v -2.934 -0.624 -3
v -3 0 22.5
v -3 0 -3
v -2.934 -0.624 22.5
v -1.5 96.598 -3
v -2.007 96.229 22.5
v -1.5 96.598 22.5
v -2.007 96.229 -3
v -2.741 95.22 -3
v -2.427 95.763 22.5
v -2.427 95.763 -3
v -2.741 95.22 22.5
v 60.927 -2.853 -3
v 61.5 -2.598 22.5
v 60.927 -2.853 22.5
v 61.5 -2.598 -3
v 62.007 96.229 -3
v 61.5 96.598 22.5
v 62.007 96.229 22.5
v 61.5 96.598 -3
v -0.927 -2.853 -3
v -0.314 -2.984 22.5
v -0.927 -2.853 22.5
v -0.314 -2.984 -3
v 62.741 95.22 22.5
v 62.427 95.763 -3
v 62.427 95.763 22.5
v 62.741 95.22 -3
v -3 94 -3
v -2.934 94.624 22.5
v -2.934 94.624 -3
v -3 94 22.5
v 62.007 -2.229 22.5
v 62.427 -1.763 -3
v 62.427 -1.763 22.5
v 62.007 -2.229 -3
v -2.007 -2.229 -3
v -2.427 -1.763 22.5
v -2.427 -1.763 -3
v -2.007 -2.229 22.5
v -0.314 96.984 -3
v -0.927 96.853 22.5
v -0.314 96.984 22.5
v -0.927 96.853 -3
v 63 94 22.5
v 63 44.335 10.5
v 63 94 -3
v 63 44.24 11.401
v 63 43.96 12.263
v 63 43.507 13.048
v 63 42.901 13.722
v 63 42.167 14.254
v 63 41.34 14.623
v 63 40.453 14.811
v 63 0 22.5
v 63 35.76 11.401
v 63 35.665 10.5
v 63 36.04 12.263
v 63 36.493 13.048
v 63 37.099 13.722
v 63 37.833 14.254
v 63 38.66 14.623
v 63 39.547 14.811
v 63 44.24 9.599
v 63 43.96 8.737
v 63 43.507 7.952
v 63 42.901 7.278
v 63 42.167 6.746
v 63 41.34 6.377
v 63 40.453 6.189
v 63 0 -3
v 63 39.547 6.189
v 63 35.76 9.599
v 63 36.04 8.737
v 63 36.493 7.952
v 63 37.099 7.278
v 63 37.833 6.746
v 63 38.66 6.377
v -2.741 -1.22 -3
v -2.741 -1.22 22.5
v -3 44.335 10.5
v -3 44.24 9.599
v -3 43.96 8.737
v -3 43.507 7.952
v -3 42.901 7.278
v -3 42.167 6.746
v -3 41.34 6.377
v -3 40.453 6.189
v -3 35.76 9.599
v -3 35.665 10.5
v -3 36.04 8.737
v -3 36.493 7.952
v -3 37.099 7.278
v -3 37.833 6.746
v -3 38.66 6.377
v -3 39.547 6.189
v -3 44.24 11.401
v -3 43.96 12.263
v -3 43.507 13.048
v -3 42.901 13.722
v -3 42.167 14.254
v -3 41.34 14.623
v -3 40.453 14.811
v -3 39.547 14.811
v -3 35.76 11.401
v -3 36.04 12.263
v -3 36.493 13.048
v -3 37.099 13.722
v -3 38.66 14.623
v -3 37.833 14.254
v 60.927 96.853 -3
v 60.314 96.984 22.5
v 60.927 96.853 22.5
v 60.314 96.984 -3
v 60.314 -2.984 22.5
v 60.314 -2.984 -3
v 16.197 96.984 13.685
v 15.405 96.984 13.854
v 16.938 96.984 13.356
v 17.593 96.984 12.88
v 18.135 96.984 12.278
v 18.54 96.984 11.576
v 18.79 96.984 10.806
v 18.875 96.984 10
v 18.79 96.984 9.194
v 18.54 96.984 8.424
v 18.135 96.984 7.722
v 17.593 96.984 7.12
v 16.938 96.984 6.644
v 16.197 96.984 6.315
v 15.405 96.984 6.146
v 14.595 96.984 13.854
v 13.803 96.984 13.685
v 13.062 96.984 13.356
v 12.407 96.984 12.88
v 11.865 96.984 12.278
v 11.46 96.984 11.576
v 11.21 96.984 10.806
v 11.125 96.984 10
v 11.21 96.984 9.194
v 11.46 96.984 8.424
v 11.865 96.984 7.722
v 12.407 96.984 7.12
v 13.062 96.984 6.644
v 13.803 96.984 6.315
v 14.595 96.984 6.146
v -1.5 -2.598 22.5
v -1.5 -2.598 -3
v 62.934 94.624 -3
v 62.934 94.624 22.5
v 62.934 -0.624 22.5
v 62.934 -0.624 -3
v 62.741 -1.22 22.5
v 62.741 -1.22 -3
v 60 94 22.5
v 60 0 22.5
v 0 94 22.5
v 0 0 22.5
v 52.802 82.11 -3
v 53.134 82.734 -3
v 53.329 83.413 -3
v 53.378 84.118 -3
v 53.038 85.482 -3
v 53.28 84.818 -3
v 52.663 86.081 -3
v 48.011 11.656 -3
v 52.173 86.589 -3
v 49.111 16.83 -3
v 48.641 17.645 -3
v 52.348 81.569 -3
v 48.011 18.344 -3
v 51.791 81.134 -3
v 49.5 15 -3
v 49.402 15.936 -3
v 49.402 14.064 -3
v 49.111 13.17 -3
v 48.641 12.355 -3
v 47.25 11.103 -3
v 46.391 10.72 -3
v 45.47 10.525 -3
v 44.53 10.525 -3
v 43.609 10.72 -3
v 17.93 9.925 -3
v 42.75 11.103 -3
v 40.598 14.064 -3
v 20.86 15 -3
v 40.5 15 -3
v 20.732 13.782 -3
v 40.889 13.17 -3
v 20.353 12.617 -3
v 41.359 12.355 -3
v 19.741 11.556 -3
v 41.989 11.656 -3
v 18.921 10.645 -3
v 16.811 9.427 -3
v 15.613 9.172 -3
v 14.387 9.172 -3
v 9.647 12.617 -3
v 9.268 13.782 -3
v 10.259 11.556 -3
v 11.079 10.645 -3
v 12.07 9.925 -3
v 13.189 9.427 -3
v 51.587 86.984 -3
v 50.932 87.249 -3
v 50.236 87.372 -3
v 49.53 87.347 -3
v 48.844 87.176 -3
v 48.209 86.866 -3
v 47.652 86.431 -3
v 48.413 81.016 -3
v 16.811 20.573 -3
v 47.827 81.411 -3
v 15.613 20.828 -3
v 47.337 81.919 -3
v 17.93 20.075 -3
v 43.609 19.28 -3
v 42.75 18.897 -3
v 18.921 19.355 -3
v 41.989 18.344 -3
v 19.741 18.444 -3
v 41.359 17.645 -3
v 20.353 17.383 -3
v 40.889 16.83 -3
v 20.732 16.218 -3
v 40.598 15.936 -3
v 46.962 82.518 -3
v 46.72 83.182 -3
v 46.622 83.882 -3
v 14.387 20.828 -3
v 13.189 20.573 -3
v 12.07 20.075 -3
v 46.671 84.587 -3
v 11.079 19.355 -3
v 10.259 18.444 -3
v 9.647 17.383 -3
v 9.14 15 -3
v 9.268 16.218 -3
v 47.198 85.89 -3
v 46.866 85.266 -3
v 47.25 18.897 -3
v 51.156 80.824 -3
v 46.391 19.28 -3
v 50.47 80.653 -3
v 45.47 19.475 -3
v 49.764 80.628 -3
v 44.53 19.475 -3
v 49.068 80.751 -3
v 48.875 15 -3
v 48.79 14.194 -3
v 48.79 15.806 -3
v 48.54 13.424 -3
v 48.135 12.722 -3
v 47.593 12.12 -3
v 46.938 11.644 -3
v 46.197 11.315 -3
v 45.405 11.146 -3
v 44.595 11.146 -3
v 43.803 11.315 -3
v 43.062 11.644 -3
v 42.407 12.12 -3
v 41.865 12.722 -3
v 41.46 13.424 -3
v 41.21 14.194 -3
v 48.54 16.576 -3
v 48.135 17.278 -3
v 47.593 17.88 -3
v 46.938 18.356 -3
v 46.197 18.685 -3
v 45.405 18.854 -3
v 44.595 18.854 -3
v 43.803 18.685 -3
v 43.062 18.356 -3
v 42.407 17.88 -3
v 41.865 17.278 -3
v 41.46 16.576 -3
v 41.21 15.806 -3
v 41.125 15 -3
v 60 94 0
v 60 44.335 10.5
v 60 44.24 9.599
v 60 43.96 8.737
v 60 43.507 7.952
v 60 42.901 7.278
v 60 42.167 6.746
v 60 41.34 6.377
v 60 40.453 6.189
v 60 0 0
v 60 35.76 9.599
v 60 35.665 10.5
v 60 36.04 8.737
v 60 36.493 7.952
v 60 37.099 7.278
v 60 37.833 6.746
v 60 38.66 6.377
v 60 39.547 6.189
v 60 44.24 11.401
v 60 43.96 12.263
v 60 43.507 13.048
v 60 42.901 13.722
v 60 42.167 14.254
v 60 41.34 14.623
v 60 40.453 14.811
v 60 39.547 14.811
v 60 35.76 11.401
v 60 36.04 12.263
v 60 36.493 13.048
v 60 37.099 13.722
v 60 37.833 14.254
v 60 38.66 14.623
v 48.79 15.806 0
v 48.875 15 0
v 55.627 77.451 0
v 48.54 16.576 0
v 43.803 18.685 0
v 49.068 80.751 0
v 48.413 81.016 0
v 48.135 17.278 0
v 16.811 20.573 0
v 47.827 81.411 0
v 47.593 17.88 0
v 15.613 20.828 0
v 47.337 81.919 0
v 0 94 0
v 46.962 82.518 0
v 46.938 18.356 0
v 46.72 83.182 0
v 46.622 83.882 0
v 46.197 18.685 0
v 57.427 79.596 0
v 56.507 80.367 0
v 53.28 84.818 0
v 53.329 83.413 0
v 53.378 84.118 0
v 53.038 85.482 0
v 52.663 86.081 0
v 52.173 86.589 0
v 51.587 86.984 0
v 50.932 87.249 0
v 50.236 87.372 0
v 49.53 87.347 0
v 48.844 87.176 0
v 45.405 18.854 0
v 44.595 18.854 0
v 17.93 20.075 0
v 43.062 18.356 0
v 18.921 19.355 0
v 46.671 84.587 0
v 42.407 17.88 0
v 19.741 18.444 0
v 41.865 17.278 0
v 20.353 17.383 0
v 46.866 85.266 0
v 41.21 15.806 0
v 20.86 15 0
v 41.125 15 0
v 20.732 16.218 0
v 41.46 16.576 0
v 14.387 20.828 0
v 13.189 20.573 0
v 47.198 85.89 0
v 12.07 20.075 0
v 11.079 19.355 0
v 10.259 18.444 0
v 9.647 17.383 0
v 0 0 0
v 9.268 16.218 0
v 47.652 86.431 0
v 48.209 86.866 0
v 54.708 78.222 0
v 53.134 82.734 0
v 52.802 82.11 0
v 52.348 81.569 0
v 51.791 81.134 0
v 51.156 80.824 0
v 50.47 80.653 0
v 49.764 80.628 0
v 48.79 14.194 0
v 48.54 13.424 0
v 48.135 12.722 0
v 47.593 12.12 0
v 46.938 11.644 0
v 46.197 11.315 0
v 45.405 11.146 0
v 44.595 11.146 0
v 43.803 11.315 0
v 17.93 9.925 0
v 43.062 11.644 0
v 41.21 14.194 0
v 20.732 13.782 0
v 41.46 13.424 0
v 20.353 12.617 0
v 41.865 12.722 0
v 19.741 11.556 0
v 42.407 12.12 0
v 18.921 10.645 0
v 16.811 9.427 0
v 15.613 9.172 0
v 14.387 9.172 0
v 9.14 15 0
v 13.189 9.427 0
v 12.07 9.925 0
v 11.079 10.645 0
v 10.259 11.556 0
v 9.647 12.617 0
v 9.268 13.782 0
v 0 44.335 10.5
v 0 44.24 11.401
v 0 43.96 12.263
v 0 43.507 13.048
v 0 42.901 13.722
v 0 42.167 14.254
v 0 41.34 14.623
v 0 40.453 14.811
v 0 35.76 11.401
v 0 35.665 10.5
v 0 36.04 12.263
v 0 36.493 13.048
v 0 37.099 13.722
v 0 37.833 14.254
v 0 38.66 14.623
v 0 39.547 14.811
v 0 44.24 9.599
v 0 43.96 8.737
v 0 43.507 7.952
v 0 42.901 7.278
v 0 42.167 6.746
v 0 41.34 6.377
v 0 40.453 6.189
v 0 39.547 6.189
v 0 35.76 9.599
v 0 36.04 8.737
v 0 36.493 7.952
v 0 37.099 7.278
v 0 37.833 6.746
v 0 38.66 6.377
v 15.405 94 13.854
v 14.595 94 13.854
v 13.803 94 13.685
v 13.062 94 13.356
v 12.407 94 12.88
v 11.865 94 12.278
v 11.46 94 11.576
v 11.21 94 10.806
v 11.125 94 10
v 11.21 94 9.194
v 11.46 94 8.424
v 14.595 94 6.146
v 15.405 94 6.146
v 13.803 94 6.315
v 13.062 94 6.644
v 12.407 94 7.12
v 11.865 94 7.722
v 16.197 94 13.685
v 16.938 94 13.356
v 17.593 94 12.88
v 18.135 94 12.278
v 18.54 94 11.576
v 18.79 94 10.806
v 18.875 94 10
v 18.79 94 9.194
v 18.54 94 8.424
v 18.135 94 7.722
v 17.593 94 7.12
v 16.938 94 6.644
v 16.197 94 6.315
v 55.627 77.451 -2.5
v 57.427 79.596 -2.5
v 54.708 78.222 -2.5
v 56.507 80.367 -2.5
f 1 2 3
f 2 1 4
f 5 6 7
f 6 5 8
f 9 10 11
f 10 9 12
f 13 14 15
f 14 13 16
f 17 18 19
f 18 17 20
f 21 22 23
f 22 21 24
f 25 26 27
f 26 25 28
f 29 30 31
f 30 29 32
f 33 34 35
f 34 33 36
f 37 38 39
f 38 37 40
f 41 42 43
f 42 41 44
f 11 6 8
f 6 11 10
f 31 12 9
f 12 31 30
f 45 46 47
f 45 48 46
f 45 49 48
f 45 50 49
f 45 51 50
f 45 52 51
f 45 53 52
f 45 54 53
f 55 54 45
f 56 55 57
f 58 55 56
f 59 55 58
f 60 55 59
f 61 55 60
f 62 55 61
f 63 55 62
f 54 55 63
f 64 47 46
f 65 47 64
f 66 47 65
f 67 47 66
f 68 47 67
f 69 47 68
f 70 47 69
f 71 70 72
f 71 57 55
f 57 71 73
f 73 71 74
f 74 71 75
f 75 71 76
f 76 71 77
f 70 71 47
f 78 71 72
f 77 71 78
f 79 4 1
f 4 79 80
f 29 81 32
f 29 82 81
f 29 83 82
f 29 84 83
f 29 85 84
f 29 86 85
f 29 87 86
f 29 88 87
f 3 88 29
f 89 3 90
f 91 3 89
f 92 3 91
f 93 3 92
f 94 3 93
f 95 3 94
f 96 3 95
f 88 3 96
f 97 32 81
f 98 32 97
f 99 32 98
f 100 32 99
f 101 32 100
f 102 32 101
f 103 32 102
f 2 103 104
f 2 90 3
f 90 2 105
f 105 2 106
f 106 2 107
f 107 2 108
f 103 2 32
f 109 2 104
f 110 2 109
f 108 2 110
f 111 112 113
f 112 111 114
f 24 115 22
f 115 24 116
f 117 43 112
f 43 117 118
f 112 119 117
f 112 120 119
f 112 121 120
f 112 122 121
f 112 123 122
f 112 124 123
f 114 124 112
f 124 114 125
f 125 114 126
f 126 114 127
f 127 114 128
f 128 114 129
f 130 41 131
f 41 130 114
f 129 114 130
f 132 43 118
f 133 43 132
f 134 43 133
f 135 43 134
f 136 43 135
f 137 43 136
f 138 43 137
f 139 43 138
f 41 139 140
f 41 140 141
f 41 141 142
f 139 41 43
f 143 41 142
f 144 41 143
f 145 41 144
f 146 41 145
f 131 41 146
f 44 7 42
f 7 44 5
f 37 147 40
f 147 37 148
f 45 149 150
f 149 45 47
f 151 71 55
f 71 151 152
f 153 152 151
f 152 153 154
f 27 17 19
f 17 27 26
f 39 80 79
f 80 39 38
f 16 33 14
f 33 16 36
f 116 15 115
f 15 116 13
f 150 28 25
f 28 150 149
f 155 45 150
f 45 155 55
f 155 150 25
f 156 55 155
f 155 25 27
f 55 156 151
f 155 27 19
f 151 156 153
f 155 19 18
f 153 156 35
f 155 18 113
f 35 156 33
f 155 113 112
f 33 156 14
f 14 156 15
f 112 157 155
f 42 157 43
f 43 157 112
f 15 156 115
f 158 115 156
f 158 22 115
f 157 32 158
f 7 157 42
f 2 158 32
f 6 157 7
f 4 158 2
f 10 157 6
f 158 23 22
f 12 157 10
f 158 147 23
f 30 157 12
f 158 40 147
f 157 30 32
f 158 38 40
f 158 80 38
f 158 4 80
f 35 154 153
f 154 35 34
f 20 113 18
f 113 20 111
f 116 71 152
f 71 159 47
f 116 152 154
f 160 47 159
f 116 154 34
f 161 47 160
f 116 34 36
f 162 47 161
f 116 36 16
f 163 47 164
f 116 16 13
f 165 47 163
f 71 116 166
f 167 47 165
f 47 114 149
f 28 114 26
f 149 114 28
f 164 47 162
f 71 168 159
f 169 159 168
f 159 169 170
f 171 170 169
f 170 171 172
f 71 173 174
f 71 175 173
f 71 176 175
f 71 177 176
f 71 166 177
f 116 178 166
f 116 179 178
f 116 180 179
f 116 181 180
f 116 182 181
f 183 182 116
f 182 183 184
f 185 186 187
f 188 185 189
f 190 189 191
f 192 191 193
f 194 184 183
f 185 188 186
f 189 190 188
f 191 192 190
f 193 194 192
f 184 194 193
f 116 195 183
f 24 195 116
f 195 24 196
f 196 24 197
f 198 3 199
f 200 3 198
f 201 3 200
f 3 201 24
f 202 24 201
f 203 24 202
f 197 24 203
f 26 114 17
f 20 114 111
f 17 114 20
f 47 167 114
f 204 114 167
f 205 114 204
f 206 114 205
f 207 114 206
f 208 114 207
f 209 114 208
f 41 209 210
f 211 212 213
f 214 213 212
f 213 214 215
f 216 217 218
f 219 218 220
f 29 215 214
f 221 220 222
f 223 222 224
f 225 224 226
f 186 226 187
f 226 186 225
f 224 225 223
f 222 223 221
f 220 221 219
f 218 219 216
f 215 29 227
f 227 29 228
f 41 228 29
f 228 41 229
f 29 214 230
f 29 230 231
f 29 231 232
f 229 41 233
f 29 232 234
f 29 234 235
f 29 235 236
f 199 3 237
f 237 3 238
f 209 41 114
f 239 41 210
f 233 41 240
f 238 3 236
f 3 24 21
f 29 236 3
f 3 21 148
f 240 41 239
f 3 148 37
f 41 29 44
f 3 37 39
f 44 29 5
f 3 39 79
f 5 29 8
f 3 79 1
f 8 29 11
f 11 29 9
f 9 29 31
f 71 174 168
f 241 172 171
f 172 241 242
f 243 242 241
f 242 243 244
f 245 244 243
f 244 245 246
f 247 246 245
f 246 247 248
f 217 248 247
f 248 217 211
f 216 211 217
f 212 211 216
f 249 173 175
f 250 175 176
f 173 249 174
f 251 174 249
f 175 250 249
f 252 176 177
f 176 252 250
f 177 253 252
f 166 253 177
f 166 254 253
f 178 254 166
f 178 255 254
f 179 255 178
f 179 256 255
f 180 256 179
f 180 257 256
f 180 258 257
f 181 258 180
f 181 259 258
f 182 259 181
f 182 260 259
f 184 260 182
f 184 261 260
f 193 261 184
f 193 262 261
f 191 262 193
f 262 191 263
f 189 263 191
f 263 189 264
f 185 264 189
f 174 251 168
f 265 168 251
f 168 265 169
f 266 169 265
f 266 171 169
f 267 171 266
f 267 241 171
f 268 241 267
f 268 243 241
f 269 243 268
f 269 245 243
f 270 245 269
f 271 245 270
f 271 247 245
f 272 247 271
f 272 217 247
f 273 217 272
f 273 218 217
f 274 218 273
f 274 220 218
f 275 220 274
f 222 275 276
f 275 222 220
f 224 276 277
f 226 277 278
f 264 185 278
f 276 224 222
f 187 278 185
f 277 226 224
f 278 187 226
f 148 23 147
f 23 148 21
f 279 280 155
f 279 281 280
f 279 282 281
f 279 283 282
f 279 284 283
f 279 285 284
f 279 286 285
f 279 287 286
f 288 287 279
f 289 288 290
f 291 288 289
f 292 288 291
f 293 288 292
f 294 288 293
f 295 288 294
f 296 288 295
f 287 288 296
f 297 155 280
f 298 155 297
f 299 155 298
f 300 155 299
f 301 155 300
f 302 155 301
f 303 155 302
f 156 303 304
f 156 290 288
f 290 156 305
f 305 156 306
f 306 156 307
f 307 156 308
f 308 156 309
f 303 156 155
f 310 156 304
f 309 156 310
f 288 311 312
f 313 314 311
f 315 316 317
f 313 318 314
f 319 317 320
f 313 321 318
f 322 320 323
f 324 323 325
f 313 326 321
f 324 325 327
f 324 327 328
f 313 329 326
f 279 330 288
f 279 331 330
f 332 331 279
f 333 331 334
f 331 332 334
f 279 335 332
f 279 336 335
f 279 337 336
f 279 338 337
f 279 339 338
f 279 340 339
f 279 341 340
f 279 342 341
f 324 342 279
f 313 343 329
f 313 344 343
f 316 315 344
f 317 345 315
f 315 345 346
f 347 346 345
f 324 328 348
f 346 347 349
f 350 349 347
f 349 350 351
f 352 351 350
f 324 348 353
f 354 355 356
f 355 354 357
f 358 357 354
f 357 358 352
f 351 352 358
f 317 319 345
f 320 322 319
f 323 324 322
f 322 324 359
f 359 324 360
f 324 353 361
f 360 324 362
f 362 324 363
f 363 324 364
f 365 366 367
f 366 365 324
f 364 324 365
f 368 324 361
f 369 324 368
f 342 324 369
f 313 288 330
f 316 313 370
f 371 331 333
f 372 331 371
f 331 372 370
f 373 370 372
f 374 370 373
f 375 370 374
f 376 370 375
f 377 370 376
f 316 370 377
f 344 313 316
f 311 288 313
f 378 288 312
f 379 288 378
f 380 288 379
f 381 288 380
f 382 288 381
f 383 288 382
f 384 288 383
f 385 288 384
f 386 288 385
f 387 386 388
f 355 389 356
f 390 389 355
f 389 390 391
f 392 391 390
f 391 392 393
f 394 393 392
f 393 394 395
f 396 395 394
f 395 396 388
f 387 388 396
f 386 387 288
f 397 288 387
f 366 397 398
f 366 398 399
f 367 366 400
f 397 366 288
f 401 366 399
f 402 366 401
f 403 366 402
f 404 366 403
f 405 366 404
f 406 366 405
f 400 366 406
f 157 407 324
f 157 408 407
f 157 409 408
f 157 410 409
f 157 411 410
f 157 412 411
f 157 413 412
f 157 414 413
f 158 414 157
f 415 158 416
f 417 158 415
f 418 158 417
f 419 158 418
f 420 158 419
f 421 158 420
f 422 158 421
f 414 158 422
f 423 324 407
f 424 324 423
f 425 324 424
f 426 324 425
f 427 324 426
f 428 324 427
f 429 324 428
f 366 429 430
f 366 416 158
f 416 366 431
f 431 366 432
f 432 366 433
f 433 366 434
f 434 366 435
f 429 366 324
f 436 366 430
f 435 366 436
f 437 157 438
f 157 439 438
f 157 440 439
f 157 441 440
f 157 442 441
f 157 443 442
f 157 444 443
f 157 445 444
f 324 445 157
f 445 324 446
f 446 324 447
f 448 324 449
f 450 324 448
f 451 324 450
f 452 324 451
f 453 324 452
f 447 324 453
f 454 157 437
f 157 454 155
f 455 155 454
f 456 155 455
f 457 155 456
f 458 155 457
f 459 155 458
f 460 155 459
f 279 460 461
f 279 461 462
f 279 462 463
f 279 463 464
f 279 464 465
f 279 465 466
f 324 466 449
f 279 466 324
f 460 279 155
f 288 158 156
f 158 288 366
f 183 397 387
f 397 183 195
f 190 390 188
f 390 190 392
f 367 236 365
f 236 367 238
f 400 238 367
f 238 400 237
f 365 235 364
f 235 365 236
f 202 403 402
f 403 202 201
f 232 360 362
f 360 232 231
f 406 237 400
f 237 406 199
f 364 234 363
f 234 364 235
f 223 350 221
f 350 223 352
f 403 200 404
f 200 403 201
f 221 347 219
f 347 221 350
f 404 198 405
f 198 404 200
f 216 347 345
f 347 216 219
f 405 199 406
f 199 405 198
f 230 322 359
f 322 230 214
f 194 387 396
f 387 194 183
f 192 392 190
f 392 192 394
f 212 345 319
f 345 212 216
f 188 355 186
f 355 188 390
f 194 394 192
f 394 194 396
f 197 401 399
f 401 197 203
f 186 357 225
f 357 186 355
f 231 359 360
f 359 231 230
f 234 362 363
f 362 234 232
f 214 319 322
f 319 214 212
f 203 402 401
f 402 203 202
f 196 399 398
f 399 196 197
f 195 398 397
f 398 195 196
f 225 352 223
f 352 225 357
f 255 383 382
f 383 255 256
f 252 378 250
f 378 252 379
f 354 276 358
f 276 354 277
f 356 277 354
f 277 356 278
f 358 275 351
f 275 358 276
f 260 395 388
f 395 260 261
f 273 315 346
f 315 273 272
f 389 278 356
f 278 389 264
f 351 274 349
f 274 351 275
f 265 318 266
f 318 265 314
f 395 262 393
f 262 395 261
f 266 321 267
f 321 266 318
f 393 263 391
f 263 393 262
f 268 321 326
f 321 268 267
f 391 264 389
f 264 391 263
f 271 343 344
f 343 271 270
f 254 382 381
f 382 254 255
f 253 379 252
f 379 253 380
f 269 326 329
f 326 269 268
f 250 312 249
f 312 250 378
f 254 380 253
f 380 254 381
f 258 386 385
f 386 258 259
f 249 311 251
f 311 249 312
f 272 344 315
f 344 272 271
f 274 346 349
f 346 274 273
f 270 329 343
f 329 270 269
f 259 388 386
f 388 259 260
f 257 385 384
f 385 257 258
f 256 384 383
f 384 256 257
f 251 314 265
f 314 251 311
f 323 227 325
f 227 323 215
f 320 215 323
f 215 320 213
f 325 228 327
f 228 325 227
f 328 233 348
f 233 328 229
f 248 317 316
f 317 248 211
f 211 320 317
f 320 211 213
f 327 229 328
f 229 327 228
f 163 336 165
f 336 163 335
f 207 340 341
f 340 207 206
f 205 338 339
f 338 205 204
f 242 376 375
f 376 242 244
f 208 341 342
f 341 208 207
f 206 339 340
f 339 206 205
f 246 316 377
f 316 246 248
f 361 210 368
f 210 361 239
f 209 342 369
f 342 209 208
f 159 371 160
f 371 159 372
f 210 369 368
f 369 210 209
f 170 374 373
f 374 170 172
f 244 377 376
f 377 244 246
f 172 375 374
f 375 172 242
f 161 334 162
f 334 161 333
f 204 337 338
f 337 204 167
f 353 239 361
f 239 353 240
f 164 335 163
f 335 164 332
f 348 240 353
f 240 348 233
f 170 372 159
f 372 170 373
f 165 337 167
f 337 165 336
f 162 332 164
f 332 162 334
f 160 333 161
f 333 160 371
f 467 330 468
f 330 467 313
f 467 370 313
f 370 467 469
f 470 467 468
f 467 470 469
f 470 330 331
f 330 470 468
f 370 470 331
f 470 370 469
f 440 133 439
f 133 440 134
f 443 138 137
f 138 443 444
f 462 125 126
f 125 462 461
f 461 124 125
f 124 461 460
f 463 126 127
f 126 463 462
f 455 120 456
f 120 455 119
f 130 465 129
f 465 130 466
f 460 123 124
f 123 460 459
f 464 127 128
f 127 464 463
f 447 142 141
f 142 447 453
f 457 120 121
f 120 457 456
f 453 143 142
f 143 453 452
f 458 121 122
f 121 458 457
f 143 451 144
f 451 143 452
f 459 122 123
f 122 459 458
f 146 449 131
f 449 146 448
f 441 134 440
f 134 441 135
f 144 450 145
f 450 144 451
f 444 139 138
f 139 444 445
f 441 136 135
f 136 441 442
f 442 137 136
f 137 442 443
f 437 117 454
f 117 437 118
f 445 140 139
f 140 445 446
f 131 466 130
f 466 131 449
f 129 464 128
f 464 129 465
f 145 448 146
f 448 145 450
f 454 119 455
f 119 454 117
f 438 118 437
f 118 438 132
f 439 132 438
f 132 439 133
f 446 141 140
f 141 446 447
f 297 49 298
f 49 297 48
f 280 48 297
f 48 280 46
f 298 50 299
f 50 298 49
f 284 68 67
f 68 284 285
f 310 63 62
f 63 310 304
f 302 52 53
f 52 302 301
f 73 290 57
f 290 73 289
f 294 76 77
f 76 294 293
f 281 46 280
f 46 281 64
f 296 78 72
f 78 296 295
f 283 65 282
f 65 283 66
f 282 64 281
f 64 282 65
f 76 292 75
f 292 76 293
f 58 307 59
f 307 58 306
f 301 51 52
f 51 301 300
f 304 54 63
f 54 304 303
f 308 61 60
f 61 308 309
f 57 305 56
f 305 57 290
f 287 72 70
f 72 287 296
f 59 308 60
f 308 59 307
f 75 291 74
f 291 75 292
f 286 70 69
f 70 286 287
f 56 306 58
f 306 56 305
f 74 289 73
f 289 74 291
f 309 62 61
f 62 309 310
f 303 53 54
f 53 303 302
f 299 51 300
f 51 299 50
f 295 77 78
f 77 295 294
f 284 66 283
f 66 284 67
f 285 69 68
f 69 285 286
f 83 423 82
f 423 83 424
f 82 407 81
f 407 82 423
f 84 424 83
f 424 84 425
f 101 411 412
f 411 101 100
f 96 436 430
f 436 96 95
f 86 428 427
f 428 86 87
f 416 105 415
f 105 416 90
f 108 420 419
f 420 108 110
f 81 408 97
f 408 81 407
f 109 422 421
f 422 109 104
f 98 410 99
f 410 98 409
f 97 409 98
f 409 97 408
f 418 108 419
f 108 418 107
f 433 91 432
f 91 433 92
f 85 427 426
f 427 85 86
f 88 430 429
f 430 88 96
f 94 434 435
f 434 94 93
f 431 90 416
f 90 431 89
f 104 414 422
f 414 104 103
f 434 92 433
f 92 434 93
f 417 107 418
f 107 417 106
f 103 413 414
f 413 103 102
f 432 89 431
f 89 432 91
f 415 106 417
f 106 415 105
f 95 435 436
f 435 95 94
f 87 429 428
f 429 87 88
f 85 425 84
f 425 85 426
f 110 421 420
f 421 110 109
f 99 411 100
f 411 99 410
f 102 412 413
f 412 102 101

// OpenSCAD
// file: lib/parts.scad
module potentiometer(angle = 0) {

	potCylR = 17.04 / 2;
	potCylD = 9.3;
	potShaftR = 6.76 / 2;
	potShaftD = 15;
	potBoard = 12;
	potBoardD = 6.3;
	potTabW = 2.8;
	potTabH = 1.2;
	potTabD = 2.5;

	rotate([0, 180, angle])
	translate([0, 0, -potCylD/2])

	union() {
		cylinder(r = potCylR, h = potCylD, center = true);
		translate([0, 0, potCylD])
			cylinder(r = potShaftR, h = potShaftD, center = true);
		translate([0, -potCylR, potCylD/2 - potBoardD])
			cube([potBoard, potCylR * 2, potBoardD]);
		translate([-potTabW/2, -potCylR, potCylD / 2])
			#cube([potTabW, potTabH, potTabD]);
	}
}

module sw3pdt() {
	swBodyW = 18;
	swBodyH = 17;
	swBodyD = 20;
	swShaftR = 11.72 / 2;
	swShaftD = 12.5;
	swShaft2R = 8 / 2;
	swShaft2D = 5.11;
	swShaft3D = 5;

	rotate([0, 180, 0])
		union() {
			translate([-swBodyW/2, -swBodyH/2, -swBodyD])
				#cube([swBodyW, swBodyH, swBodyD]);
			translate([0, 0, swShaftD / 2]) //  swBodyD + swShaftD/2])
				cylinder(r = swShaftR, h = swShaftD, center = true);
			translate([0, 0, swShaftD + swShaft2D / 2]) //  swBodyD + swShaftD/2])
				cylinder(r = swShaft2R, h = swShaft3D, center = true);
			translate([0, 0, swShaftD + swShaft2D + swShaft3D / 2]) //  swBodyD + swShaftD/2])
				cylinder(r = swShaftR, h = swShaft3D, center = true);
		}
}

module swdp3t() {
    swBodyW = 12.62;
    swBodyH = 13;
    swBodyD = 14.5;
    swShaftR = 5.8 / 2;
    swShaftD = 8.5;

	rotate([0, 180, 0])
	union() {
	    translate([-swBodyW/2, -swBodyH/2, -swBodyD])
			#cube([swBodyW, swBodyH, swBodyD]);
		translate([0, 0, swShaftD / 2]) //  swBodyD + swShaftD/2])
			cylinder(r = swShaftR, h = swShaftD, center = true);
	}
}

module socket(angle = 90) {
	sktR = 8.67 / 2;
	sktD = 7.6;
	sktBaseR = 20.40 / 2;
	sktBaseH = 23.6;

	rotate([angle, 0, 90])
		union() {
			cylinder(r = sktR, h = sktD);
			translate([0, 0, -sktBaseH])
			cylinder(r = sktBaseR, h = sktBaseH);
		}
}

module smDcJack() {
	dcJackR = 7.75 / 2;
	dcJackD = 5.5;
	dcJackBaseR = 10.75 / 2;
	dcJackBaseH = 15.65;

	rotate([-90, 0, 0])
		union() {
		    cylinder(r = dcJackR, h = dcJackD);
		    translate([0, 0, -dcJackBaseH])
		    cylinder(r = dcJackBaseR, h = dcJackBaseH);
		}
}

module ledMount() {
	ledMountR = 7.75 / 2;
	ledMountD = 10;
	ledMountBaseR1 = 9 / 2;
	ledMountBaseR2 = 8 / 2;
	ledMountBaseH = 3.8;

	rotate([0, 180, 0])
		union() {
		    cylinder(r1 = ledMountBaseR1, r2 = ledMountBaseR2, h = ledMountBaseH);
		    translate([0, 0, -ledMountD])
			    cylinder(r = ledMountR, h = ledMountD);
		}
}
// main file
$fn=30;

use <lib/parts.scad>;

wallD = 3;

inBoxW = 60;			// Altoids 58.5
inBoxH = 94;			// Altoids 93.5
inBoxD = 22;			// Altoids 21.5

outBoxW = inBoxW; // + wallD * 2;
outBoxH = inBoxH; // + wallD * 2;
outBoxD = inBoxD + wallD;


module box() {
	difference() {
//		translate([-wallD, -wallD, -wallD])
		translate([0, 0, -wallD])
			minkowski() {
				cube([outBoxW, outBoxH, outBoxD]);
				cylinder(r=3,h=.5);
			}
		cube([inBoxW, inBoxH, inBoxD+1]);
	}
}

//translate([0, 0, 0])
//	potentiometer();
// sw3pdt();
//socket();
//smDcJack();
//ledMount();
//swdp3t();

module config1() {		// good for HogsFoot, Screaming Bird
	offsetStompX = 15;
	offsetStompY = 15;
	offsetLEDX = inBoxW - 15;
	offsetLEDY = 15;
	offsetPotX = inBoxW - 10;
	offsetPotY = inBoxH - 10;
	offsetDCX = 15;
	offsetDCY = inBoxH-.1;
	offsetDCZ = 10;
	offsetJackInX = inBoxW;
	offsetJackInY = 40;
	offsetJackInZ = 10.5;
	offsetJackOutX = 0;
	offsetJackOutY = 40;
	offsetJackOutZ = 10.5;

	difference() {
		#box();
		translate([offsetStompX, offsetStompY, 0])
			#color([0,0,1]) sw3pdt();
		translate([offsetLEDX, offsetLEDY, -wallD])
			#ledMount();
		translate([offsetPotX, offsetPotY, 0])
			#potentiometer(angle = 50);
		translate([offsetDCX, offsetDCY, offsetDCZ])
			#smDcJack();
		translate([offsetJackInX, offsetJackInY, offsetJackInZ])
			#socket(angle = 90);
		translate([offsetJackOutX, offsetJackOutY, offsetJackOutZ])
			#socket(angle = 270);

	}
}

config1();
